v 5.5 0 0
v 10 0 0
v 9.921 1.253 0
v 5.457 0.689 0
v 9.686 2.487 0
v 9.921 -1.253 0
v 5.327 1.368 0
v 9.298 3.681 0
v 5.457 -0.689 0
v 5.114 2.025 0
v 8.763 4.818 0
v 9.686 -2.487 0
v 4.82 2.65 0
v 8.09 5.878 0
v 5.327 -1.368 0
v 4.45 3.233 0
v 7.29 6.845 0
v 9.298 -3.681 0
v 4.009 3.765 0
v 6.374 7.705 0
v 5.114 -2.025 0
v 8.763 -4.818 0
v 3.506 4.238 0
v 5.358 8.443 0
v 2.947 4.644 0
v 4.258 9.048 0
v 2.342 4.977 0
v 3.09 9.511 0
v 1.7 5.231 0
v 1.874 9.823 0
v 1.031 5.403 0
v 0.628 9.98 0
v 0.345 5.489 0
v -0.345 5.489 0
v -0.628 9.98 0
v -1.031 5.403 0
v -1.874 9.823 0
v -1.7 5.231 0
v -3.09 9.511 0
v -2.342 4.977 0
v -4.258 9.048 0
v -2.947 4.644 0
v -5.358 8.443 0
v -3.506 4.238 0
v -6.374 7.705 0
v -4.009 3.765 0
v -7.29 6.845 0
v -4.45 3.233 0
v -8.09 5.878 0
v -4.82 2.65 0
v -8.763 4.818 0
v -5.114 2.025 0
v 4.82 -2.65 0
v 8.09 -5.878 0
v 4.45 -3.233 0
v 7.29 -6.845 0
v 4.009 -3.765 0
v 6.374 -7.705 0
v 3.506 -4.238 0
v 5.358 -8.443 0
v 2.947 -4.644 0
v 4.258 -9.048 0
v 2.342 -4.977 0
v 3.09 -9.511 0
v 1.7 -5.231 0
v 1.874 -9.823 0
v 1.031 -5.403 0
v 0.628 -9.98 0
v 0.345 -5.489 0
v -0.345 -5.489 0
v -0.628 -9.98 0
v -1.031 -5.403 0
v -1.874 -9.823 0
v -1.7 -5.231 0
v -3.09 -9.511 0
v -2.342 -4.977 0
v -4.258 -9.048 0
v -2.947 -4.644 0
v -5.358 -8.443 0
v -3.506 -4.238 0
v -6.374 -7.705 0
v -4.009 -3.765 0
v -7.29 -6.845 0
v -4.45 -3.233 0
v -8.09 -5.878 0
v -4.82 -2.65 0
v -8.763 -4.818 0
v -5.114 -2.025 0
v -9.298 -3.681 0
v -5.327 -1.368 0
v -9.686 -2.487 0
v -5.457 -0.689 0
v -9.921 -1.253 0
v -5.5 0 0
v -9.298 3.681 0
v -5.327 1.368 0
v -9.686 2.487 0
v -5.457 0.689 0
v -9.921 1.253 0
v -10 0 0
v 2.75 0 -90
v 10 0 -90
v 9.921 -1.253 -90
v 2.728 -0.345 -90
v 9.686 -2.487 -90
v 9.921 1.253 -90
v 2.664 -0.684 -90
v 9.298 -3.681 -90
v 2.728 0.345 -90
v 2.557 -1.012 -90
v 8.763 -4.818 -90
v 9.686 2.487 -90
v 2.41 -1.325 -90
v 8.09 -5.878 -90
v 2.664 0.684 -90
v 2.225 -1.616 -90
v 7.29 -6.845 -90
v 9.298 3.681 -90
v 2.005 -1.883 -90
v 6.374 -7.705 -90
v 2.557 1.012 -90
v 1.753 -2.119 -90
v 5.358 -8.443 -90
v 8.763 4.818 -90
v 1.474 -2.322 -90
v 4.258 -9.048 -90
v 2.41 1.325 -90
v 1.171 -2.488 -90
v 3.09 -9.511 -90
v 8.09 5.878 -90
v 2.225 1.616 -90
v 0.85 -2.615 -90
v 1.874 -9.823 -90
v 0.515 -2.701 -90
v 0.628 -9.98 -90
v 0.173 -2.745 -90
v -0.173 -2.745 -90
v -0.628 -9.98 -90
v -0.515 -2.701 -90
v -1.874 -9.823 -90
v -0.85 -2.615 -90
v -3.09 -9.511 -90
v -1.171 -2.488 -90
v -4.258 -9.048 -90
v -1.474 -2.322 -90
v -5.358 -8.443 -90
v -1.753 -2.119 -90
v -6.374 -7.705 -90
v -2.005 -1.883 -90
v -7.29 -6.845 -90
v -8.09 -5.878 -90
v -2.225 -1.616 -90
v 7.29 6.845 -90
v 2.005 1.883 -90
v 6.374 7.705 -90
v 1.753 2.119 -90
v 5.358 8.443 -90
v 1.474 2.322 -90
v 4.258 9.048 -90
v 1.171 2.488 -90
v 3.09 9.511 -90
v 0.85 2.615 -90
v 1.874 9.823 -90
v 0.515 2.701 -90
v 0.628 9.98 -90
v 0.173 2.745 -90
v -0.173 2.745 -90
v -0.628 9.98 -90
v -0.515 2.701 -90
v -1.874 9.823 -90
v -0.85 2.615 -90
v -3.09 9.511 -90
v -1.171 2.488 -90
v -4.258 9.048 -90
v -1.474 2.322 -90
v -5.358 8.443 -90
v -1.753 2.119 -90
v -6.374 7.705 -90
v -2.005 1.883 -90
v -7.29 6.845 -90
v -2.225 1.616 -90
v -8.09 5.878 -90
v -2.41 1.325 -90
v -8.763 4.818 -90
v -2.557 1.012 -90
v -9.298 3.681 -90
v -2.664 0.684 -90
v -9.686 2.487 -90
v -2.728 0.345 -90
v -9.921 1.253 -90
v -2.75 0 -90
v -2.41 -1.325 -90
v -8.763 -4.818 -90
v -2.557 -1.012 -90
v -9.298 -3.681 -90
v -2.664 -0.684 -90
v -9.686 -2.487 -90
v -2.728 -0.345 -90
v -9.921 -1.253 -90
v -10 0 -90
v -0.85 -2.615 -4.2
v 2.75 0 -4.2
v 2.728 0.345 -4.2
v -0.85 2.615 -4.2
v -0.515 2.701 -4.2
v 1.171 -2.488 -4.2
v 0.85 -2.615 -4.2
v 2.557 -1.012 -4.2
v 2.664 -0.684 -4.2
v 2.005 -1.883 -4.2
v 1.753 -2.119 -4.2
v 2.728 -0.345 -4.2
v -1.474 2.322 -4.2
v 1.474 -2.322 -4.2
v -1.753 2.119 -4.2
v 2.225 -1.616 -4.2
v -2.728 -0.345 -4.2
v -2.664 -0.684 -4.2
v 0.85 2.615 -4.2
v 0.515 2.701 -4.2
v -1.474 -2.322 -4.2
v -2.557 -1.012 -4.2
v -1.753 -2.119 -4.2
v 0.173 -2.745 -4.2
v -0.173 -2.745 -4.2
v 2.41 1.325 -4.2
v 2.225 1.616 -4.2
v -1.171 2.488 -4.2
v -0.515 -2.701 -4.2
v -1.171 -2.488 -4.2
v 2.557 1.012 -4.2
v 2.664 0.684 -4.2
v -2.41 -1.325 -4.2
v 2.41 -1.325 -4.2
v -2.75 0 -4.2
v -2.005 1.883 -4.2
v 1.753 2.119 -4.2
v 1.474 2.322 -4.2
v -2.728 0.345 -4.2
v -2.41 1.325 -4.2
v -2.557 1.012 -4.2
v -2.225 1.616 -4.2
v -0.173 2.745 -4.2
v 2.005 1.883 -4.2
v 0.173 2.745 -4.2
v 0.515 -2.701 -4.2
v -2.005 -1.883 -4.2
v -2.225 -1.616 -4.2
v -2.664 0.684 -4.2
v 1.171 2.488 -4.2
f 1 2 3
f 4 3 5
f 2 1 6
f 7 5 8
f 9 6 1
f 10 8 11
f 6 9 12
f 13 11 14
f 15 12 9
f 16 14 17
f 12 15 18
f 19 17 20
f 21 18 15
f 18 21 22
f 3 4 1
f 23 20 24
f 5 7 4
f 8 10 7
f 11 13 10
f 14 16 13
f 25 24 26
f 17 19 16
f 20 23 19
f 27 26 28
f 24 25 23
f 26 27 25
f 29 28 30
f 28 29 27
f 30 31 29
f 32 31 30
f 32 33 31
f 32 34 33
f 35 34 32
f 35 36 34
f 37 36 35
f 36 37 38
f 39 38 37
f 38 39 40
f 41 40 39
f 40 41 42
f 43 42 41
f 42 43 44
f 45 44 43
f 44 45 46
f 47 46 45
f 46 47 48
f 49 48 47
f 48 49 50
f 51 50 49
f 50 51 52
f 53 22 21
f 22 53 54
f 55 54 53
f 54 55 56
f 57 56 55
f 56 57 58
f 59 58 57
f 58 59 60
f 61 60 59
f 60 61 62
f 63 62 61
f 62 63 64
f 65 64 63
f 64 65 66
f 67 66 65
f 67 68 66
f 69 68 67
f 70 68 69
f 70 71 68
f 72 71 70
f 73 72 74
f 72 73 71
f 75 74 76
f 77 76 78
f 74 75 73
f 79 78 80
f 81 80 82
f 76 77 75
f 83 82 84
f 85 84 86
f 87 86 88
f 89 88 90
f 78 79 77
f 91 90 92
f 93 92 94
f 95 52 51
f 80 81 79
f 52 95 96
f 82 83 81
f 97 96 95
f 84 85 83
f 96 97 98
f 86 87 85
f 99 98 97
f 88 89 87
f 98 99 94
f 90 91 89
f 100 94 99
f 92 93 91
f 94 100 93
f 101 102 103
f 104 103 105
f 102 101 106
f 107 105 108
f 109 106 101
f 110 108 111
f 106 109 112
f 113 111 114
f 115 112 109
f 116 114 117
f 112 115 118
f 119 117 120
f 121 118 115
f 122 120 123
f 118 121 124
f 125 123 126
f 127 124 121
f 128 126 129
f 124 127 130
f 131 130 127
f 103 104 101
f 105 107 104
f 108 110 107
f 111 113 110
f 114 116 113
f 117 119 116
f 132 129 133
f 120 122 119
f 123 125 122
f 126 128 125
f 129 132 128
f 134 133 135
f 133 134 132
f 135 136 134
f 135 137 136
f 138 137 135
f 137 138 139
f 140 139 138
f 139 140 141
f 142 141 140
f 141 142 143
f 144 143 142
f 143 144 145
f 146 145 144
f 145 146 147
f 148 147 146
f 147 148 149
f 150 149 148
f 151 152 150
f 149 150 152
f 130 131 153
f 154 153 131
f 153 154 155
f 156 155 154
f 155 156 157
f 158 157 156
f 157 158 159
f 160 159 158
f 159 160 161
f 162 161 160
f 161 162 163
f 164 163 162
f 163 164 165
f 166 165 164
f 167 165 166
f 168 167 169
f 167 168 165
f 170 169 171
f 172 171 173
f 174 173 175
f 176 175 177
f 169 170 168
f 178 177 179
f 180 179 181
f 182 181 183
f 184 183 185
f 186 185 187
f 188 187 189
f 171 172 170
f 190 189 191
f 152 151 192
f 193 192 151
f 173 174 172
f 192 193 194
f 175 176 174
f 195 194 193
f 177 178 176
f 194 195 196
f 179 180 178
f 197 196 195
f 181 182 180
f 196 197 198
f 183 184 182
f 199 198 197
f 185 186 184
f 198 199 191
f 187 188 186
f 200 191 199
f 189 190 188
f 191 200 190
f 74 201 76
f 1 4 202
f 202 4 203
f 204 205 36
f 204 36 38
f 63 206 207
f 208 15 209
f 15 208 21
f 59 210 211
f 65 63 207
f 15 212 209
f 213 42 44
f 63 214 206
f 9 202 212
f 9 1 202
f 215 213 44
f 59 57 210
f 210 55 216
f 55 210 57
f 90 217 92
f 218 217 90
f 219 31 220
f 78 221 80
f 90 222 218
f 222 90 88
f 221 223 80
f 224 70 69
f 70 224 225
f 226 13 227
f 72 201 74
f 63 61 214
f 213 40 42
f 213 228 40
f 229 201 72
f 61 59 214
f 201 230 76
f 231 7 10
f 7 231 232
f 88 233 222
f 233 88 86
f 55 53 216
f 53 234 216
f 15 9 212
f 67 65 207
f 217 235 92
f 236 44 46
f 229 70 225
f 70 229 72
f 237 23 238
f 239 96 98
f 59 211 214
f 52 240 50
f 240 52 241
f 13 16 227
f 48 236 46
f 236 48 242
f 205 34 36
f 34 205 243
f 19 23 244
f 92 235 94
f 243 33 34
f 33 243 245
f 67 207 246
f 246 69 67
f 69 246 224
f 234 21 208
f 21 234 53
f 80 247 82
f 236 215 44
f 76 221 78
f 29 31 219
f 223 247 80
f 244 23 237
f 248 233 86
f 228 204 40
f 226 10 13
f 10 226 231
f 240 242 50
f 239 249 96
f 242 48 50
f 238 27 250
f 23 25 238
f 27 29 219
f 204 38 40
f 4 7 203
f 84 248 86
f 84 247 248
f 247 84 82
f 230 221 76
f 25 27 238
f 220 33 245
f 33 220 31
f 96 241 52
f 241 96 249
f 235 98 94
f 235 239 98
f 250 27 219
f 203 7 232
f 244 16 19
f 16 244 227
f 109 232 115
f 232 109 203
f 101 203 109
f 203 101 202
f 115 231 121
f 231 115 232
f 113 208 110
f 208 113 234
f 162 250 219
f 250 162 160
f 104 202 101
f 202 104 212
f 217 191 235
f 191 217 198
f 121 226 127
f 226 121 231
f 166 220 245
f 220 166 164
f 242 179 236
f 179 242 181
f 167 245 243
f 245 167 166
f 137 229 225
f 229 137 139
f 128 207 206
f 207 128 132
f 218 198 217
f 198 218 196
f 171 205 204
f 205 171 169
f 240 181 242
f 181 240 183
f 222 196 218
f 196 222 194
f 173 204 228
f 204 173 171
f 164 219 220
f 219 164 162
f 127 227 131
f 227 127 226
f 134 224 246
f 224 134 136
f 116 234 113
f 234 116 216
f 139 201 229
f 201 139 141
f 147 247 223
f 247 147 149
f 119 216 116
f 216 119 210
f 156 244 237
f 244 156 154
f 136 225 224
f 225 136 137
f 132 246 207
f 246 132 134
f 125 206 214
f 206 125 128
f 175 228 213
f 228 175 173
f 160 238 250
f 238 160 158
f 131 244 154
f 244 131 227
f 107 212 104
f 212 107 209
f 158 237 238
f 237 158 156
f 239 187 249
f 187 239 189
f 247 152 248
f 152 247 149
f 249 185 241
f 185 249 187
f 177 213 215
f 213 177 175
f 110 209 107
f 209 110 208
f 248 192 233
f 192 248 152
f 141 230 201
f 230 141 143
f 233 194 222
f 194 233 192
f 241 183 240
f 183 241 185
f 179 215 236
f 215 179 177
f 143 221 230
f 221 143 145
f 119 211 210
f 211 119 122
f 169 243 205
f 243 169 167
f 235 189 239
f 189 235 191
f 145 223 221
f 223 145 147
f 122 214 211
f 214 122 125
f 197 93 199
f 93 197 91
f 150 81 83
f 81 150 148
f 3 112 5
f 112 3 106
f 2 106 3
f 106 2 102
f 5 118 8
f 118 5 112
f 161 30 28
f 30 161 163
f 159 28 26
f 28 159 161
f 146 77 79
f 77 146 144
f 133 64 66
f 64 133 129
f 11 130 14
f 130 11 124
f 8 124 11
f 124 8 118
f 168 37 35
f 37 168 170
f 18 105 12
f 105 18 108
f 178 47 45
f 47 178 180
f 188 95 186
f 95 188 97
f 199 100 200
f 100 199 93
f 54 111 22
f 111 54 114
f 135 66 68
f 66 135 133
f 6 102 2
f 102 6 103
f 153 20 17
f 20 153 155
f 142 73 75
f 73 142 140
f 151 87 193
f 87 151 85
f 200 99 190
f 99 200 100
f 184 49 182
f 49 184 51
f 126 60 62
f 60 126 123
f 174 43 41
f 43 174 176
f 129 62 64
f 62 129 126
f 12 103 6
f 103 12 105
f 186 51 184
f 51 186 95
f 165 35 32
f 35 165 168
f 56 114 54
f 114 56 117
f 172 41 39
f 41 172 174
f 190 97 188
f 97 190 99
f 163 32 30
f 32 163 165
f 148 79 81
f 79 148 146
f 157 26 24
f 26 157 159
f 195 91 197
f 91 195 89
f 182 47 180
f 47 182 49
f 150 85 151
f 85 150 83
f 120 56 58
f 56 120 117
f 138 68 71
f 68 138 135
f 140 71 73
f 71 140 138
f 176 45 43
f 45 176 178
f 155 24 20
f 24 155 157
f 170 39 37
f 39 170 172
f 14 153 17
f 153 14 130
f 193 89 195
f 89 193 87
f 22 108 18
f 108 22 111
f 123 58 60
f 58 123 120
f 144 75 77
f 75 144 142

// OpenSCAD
$fn = 50;


difference() {
	union() {
		translate(v = [0, 0, -90.0000000000]) {
			cylinder(h = 90, r = 10.0000000000);
		}
		cylinder(h = 0, r = 19.0000000000);
	}
	union() {
		translate(v = [0, 0, 0]) {
			rotate(a = [0, 0, 0]) {
				difference() {
					union() {
						#translate(v = [0, 0, -90.0000000000]) {
							cylinder(h = 90, r = 2.2500000000);
						}
						#translate(v = [0, 0, -4.2000000000]) {
							cylinder(h = 4.2000000000, r = 10.0000000000, r1 = 2.7500000000, r2 = 5.5000000000);
						}
						#translate(v = [0, 0, -90.0000000000]) {
							cylinder(h = 90, r = 2.7500000000);
						}
						#translate(v = [0, 0, -90.0000000000]) {
							cylinder(h = 90, r = 2.2500000000);
						}
					}
					union();
				}
			}
		}
	}
}
